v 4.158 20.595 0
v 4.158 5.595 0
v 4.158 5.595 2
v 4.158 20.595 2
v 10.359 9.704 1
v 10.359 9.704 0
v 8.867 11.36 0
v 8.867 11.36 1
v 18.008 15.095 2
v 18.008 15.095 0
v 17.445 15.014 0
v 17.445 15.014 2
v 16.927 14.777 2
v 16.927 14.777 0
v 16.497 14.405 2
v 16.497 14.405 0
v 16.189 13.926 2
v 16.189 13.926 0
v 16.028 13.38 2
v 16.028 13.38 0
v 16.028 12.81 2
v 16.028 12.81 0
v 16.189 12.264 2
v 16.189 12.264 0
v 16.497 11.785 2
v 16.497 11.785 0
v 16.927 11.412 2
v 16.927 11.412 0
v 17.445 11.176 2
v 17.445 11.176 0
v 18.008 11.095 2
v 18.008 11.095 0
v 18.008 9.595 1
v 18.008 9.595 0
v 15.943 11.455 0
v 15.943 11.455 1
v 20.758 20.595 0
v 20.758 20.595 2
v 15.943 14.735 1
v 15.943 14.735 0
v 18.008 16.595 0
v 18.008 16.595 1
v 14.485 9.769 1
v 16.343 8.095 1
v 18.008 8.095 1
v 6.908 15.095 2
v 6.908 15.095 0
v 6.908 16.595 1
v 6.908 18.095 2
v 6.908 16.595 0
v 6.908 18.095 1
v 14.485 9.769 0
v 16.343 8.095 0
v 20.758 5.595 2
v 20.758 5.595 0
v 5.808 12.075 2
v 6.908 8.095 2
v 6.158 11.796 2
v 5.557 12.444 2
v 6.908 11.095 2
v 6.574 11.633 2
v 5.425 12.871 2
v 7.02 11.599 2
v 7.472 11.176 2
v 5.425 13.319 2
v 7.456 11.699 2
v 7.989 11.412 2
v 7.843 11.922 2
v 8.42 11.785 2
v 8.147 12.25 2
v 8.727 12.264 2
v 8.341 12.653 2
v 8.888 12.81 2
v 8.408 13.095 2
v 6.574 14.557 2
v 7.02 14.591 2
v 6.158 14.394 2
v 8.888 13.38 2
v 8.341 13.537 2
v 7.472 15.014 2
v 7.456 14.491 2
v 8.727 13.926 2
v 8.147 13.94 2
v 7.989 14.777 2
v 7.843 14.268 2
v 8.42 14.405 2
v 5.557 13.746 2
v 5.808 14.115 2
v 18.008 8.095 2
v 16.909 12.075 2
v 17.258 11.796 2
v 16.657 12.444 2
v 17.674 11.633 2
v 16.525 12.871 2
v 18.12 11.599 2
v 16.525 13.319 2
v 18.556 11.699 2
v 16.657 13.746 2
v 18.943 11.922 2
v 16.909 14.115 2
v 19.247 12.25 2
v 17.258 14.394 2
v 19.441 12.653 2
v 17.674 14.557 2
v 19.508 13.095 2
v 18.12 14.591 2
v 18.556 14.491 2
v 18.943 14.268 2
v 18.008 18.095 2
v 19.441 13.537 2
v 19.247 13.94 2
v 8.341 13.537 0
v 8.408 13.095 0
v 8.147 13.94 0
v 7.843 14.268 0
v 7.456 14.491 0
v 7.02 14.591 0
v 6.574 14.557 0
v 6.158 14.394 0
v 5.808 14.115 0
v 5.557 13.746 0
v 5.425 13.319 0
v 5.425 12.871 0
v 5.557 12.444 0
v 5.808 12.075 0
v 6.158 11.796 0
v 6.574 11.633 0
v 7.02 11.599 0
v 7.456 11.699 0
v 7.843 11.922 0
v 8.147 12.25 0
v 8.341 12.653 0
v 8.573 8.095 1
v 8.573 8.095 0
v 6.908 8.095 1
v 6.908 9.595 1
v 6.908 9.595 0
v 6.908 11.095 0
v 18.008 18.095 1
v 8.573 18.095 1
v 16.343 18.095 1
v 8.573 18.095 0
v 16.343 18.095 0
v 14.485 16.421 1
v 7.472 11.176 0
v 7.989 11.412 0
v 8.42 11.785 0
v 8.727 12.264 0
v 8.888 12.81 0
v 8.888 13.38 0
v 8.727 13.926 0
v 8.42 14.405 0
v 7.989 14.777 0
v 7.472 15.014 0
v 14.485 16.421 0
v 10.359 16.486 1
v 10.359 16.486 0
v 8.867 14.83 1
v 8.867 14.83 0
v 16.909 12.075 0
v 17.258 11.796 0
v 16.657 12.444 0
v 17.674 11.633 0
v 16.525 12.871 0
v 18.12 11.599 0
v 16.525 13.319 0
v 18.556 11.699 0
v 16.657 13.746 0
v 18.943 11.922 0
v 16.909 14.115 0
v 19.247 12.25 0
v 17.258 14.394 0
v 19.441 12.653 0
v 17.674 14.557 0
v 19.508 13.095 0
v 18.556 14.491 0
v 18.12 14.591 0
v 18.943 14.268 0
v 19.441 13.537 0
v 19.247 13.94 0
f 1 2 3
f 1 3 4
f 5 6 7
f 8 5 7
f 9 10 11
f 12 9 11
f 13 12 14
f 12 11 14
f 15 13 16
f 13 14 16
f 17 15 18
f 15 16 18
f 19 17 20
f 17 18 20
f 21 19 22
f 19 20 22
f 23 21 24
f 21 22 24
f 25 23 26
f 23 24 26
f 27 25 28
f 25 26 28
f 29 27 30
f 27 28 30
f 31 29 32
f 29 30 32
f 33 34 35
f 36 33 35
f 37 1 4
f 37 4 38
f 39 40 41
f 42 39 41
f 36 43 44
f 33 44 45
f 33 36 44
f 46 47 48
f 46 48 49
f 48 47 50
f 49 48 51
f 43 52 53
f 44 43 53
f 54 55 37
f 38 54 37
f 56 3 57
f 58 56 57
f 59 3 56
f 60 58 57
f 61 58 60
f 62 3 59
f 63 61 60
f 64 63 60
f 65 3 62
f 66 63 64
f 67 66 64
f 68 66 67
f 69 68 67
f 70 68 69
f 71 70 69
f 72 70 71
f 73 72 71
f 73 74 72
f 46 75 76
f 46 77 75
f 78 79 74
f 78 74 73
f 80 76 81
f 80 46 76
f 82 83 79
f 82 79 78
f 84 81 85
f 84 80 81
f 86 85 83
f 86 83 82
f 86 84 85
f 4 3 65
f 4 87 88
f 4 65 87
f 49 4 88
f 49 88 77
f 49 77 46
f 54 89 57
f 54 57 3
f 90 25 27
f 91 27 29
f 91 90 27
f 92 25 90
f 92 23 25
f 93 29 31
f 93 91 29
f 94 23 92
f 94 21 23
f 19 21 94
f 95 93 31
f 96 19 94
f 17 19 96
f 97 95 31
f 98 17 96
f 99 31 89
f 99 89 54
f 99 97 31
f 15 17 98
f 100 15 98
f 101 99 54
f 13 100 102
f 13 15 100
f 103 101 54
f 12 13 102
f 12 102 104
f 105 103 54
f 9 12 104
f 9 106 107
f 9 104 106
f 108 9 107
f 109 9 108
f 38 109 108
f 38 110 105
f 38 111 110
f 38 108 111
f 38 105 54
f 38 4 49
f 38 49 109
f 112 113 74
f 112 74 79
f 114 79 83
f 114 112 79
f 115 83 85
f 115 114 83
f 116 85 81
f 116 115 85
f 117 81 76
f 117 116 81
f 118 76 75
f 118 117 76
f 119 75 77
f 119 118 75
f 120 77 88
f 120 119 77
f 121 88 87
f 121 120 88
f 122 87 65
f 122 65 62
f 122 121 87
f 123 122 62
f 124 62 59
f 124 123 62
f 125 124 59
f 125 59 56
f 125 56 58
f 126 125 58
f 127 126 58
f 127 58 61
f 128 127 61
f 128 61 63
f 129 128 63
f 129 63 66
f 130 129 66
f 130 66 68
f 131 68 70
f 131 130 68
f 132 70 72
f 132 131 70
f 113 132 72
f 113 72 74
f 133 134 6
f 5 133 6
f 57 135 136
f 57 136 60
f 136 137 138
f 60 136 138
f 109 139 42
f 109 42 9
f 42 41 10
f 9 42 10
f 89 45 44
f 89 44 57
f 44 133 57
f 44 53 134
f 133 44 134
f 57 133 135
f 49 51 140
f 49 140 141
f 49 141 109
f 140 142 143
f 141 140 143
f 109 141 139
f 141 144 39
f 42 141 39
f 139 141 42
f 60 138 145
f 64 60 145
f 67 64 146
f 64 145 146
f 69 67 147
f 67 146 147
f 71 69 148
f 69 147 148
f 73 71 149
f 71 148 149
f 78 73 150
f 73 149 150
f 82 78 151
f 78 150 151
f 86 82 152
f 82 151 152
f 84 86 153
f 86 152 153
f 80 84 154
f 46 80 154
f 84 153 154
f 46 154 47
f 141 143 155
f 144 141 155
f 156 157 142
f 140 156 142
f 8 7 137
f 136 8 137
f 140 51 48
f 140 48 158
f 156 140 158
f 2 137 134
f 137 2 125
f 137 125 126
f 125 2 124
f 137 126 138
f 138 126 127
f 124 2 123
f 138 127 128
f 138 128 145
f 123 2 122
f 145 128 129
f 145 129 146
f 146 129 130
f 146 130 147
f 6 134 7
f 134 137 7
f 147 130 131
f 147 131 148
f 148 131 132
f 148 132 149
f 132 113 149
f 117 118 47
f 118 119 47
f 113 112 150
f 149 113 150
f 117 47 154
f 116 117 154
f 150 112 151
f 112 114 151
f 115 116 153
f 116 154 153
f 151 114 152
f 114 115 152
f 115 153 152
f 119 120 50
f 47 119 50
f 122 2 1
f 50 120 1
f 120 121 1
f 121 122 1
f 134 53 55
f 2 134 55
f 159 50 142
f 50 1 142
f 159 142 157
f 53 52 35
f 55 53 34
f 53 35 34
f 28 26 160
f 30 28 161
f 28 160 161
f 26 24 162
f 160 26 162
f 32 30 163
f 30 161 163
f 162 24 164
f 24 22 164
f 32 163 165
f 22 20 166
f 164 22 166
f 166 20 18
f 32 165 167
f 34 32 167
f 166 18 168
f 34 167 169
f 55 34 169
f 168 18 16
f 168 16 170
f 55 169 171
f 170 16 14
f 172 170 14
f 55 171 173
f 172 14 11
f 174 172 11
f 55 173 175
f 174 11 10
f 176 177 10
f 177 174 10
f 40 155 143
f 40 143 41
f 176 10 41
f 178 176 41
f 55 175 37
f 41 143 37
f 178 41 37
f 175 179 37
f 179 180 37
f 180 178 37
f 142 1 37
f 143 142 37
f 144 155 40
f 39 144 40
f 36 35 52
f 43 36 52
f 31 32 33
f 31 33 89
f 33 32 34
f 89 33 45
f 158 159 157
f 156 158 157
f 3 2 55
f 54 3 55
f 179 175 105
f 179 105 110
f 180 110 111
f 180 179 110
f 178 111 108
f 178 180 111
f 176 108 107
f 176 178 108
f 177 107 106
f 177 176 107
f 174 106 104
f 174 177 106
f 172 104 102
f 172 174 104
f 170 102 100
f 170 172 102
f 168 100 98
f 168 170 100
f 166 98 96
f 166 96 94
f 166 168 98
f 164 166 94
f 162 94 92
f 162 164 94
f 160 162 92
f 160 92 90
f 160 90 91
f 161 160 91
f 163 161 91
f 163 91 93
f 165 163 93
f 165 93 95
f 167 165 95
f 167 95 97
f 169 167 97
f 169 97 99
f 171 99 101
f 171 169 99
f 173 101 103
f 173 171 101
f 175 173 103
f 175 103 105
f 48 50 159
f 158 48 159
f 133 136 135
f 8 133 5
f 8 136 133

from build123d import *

# Parameters (mm, degrees)
SKETCH1_W           = 16.600054
SKETCH1_H           = 15
SKETCH1_R           = 1.5
BOSS_EXTRUDE1_DEPTH = 2
BOSS_EXTRUDE2_DEPTH = 1


with BuildPart() as part:
    # Sketch1 → Boss-Extrude1 (new body)
    with BuildSketch(Plane.XY):
        with Locations((12.458065, 13.09497)):
            Rectangle(SKETCH1_W, SKETCH1_H)
        with Locations((6.908038, 13.09497)):
            Circle(SKETCH1_R, mode=Mode.SUBTRACT)
        with BuildLine():
            ThreePointArc((6.908038, 11.09497), (8.908038, 13.09497), (6.908038, 15.09497))
            Line((6.908038, 15.09497), (6.908038, 18.09497))
            Line((6.908038, 18.09497), (18.008092, 18.09497))
            Line((18.008092, 18.09497), (18.008092, 15.09497))
            ThreePointArc((18.008092, 15.09497), (16.008092, 13.09497), (18.008092, 11.09497))
            Line((18.008092, 11.09497), (18.008092, 8.09497))
            Line((18.008092, 8.09497), (6.908038, 8.09497))
            Line((6.908038, 8.09497), (6.908038, 11.09497))
        make_face(mode=Mode.SUBTRACT)
        with Locations((18.008092, 13.09497)):
            Circle(SKETCH1_R, mode=Mode.SUBTRACT)
    extrude(amount=BOSS_EXTRUDE1_DEPTH)

    # Sketch1<25> → Boss-Extrude2 (add)
    with BuildSketch(Plane.XY):
        Polygon((6.908038, 18.09497), (6.908038, 16.59497), (8.866977953, 14.830167817), (10.358845842, 16.48614923), (8.5730461, 18.09497), align=None)
        Polygon((18.008092, 18.09497), (16.3430839, 18.09497), (14.485103938, 16.421122321), (15.943445071, 14.73493677), (18.008092, 16.59497), align=None)
        Polygon((14.485103938, 9.768817679), (16.3430839, 8.09497), (18.008092, 8.09497), (18.008092, 9.59497), (15.943445071, 11.45500323), align=None)
        Polygon((8.866977953, 11.359772183), (6.908038, 9.59497), (6.908038, 8.09497), (8.5730461, 8.09497), (10.358845842, 9.70379077), align=None)
    extrude(amount=BOSS_EXTRUDE2_DEPTH)


solid = part.part
